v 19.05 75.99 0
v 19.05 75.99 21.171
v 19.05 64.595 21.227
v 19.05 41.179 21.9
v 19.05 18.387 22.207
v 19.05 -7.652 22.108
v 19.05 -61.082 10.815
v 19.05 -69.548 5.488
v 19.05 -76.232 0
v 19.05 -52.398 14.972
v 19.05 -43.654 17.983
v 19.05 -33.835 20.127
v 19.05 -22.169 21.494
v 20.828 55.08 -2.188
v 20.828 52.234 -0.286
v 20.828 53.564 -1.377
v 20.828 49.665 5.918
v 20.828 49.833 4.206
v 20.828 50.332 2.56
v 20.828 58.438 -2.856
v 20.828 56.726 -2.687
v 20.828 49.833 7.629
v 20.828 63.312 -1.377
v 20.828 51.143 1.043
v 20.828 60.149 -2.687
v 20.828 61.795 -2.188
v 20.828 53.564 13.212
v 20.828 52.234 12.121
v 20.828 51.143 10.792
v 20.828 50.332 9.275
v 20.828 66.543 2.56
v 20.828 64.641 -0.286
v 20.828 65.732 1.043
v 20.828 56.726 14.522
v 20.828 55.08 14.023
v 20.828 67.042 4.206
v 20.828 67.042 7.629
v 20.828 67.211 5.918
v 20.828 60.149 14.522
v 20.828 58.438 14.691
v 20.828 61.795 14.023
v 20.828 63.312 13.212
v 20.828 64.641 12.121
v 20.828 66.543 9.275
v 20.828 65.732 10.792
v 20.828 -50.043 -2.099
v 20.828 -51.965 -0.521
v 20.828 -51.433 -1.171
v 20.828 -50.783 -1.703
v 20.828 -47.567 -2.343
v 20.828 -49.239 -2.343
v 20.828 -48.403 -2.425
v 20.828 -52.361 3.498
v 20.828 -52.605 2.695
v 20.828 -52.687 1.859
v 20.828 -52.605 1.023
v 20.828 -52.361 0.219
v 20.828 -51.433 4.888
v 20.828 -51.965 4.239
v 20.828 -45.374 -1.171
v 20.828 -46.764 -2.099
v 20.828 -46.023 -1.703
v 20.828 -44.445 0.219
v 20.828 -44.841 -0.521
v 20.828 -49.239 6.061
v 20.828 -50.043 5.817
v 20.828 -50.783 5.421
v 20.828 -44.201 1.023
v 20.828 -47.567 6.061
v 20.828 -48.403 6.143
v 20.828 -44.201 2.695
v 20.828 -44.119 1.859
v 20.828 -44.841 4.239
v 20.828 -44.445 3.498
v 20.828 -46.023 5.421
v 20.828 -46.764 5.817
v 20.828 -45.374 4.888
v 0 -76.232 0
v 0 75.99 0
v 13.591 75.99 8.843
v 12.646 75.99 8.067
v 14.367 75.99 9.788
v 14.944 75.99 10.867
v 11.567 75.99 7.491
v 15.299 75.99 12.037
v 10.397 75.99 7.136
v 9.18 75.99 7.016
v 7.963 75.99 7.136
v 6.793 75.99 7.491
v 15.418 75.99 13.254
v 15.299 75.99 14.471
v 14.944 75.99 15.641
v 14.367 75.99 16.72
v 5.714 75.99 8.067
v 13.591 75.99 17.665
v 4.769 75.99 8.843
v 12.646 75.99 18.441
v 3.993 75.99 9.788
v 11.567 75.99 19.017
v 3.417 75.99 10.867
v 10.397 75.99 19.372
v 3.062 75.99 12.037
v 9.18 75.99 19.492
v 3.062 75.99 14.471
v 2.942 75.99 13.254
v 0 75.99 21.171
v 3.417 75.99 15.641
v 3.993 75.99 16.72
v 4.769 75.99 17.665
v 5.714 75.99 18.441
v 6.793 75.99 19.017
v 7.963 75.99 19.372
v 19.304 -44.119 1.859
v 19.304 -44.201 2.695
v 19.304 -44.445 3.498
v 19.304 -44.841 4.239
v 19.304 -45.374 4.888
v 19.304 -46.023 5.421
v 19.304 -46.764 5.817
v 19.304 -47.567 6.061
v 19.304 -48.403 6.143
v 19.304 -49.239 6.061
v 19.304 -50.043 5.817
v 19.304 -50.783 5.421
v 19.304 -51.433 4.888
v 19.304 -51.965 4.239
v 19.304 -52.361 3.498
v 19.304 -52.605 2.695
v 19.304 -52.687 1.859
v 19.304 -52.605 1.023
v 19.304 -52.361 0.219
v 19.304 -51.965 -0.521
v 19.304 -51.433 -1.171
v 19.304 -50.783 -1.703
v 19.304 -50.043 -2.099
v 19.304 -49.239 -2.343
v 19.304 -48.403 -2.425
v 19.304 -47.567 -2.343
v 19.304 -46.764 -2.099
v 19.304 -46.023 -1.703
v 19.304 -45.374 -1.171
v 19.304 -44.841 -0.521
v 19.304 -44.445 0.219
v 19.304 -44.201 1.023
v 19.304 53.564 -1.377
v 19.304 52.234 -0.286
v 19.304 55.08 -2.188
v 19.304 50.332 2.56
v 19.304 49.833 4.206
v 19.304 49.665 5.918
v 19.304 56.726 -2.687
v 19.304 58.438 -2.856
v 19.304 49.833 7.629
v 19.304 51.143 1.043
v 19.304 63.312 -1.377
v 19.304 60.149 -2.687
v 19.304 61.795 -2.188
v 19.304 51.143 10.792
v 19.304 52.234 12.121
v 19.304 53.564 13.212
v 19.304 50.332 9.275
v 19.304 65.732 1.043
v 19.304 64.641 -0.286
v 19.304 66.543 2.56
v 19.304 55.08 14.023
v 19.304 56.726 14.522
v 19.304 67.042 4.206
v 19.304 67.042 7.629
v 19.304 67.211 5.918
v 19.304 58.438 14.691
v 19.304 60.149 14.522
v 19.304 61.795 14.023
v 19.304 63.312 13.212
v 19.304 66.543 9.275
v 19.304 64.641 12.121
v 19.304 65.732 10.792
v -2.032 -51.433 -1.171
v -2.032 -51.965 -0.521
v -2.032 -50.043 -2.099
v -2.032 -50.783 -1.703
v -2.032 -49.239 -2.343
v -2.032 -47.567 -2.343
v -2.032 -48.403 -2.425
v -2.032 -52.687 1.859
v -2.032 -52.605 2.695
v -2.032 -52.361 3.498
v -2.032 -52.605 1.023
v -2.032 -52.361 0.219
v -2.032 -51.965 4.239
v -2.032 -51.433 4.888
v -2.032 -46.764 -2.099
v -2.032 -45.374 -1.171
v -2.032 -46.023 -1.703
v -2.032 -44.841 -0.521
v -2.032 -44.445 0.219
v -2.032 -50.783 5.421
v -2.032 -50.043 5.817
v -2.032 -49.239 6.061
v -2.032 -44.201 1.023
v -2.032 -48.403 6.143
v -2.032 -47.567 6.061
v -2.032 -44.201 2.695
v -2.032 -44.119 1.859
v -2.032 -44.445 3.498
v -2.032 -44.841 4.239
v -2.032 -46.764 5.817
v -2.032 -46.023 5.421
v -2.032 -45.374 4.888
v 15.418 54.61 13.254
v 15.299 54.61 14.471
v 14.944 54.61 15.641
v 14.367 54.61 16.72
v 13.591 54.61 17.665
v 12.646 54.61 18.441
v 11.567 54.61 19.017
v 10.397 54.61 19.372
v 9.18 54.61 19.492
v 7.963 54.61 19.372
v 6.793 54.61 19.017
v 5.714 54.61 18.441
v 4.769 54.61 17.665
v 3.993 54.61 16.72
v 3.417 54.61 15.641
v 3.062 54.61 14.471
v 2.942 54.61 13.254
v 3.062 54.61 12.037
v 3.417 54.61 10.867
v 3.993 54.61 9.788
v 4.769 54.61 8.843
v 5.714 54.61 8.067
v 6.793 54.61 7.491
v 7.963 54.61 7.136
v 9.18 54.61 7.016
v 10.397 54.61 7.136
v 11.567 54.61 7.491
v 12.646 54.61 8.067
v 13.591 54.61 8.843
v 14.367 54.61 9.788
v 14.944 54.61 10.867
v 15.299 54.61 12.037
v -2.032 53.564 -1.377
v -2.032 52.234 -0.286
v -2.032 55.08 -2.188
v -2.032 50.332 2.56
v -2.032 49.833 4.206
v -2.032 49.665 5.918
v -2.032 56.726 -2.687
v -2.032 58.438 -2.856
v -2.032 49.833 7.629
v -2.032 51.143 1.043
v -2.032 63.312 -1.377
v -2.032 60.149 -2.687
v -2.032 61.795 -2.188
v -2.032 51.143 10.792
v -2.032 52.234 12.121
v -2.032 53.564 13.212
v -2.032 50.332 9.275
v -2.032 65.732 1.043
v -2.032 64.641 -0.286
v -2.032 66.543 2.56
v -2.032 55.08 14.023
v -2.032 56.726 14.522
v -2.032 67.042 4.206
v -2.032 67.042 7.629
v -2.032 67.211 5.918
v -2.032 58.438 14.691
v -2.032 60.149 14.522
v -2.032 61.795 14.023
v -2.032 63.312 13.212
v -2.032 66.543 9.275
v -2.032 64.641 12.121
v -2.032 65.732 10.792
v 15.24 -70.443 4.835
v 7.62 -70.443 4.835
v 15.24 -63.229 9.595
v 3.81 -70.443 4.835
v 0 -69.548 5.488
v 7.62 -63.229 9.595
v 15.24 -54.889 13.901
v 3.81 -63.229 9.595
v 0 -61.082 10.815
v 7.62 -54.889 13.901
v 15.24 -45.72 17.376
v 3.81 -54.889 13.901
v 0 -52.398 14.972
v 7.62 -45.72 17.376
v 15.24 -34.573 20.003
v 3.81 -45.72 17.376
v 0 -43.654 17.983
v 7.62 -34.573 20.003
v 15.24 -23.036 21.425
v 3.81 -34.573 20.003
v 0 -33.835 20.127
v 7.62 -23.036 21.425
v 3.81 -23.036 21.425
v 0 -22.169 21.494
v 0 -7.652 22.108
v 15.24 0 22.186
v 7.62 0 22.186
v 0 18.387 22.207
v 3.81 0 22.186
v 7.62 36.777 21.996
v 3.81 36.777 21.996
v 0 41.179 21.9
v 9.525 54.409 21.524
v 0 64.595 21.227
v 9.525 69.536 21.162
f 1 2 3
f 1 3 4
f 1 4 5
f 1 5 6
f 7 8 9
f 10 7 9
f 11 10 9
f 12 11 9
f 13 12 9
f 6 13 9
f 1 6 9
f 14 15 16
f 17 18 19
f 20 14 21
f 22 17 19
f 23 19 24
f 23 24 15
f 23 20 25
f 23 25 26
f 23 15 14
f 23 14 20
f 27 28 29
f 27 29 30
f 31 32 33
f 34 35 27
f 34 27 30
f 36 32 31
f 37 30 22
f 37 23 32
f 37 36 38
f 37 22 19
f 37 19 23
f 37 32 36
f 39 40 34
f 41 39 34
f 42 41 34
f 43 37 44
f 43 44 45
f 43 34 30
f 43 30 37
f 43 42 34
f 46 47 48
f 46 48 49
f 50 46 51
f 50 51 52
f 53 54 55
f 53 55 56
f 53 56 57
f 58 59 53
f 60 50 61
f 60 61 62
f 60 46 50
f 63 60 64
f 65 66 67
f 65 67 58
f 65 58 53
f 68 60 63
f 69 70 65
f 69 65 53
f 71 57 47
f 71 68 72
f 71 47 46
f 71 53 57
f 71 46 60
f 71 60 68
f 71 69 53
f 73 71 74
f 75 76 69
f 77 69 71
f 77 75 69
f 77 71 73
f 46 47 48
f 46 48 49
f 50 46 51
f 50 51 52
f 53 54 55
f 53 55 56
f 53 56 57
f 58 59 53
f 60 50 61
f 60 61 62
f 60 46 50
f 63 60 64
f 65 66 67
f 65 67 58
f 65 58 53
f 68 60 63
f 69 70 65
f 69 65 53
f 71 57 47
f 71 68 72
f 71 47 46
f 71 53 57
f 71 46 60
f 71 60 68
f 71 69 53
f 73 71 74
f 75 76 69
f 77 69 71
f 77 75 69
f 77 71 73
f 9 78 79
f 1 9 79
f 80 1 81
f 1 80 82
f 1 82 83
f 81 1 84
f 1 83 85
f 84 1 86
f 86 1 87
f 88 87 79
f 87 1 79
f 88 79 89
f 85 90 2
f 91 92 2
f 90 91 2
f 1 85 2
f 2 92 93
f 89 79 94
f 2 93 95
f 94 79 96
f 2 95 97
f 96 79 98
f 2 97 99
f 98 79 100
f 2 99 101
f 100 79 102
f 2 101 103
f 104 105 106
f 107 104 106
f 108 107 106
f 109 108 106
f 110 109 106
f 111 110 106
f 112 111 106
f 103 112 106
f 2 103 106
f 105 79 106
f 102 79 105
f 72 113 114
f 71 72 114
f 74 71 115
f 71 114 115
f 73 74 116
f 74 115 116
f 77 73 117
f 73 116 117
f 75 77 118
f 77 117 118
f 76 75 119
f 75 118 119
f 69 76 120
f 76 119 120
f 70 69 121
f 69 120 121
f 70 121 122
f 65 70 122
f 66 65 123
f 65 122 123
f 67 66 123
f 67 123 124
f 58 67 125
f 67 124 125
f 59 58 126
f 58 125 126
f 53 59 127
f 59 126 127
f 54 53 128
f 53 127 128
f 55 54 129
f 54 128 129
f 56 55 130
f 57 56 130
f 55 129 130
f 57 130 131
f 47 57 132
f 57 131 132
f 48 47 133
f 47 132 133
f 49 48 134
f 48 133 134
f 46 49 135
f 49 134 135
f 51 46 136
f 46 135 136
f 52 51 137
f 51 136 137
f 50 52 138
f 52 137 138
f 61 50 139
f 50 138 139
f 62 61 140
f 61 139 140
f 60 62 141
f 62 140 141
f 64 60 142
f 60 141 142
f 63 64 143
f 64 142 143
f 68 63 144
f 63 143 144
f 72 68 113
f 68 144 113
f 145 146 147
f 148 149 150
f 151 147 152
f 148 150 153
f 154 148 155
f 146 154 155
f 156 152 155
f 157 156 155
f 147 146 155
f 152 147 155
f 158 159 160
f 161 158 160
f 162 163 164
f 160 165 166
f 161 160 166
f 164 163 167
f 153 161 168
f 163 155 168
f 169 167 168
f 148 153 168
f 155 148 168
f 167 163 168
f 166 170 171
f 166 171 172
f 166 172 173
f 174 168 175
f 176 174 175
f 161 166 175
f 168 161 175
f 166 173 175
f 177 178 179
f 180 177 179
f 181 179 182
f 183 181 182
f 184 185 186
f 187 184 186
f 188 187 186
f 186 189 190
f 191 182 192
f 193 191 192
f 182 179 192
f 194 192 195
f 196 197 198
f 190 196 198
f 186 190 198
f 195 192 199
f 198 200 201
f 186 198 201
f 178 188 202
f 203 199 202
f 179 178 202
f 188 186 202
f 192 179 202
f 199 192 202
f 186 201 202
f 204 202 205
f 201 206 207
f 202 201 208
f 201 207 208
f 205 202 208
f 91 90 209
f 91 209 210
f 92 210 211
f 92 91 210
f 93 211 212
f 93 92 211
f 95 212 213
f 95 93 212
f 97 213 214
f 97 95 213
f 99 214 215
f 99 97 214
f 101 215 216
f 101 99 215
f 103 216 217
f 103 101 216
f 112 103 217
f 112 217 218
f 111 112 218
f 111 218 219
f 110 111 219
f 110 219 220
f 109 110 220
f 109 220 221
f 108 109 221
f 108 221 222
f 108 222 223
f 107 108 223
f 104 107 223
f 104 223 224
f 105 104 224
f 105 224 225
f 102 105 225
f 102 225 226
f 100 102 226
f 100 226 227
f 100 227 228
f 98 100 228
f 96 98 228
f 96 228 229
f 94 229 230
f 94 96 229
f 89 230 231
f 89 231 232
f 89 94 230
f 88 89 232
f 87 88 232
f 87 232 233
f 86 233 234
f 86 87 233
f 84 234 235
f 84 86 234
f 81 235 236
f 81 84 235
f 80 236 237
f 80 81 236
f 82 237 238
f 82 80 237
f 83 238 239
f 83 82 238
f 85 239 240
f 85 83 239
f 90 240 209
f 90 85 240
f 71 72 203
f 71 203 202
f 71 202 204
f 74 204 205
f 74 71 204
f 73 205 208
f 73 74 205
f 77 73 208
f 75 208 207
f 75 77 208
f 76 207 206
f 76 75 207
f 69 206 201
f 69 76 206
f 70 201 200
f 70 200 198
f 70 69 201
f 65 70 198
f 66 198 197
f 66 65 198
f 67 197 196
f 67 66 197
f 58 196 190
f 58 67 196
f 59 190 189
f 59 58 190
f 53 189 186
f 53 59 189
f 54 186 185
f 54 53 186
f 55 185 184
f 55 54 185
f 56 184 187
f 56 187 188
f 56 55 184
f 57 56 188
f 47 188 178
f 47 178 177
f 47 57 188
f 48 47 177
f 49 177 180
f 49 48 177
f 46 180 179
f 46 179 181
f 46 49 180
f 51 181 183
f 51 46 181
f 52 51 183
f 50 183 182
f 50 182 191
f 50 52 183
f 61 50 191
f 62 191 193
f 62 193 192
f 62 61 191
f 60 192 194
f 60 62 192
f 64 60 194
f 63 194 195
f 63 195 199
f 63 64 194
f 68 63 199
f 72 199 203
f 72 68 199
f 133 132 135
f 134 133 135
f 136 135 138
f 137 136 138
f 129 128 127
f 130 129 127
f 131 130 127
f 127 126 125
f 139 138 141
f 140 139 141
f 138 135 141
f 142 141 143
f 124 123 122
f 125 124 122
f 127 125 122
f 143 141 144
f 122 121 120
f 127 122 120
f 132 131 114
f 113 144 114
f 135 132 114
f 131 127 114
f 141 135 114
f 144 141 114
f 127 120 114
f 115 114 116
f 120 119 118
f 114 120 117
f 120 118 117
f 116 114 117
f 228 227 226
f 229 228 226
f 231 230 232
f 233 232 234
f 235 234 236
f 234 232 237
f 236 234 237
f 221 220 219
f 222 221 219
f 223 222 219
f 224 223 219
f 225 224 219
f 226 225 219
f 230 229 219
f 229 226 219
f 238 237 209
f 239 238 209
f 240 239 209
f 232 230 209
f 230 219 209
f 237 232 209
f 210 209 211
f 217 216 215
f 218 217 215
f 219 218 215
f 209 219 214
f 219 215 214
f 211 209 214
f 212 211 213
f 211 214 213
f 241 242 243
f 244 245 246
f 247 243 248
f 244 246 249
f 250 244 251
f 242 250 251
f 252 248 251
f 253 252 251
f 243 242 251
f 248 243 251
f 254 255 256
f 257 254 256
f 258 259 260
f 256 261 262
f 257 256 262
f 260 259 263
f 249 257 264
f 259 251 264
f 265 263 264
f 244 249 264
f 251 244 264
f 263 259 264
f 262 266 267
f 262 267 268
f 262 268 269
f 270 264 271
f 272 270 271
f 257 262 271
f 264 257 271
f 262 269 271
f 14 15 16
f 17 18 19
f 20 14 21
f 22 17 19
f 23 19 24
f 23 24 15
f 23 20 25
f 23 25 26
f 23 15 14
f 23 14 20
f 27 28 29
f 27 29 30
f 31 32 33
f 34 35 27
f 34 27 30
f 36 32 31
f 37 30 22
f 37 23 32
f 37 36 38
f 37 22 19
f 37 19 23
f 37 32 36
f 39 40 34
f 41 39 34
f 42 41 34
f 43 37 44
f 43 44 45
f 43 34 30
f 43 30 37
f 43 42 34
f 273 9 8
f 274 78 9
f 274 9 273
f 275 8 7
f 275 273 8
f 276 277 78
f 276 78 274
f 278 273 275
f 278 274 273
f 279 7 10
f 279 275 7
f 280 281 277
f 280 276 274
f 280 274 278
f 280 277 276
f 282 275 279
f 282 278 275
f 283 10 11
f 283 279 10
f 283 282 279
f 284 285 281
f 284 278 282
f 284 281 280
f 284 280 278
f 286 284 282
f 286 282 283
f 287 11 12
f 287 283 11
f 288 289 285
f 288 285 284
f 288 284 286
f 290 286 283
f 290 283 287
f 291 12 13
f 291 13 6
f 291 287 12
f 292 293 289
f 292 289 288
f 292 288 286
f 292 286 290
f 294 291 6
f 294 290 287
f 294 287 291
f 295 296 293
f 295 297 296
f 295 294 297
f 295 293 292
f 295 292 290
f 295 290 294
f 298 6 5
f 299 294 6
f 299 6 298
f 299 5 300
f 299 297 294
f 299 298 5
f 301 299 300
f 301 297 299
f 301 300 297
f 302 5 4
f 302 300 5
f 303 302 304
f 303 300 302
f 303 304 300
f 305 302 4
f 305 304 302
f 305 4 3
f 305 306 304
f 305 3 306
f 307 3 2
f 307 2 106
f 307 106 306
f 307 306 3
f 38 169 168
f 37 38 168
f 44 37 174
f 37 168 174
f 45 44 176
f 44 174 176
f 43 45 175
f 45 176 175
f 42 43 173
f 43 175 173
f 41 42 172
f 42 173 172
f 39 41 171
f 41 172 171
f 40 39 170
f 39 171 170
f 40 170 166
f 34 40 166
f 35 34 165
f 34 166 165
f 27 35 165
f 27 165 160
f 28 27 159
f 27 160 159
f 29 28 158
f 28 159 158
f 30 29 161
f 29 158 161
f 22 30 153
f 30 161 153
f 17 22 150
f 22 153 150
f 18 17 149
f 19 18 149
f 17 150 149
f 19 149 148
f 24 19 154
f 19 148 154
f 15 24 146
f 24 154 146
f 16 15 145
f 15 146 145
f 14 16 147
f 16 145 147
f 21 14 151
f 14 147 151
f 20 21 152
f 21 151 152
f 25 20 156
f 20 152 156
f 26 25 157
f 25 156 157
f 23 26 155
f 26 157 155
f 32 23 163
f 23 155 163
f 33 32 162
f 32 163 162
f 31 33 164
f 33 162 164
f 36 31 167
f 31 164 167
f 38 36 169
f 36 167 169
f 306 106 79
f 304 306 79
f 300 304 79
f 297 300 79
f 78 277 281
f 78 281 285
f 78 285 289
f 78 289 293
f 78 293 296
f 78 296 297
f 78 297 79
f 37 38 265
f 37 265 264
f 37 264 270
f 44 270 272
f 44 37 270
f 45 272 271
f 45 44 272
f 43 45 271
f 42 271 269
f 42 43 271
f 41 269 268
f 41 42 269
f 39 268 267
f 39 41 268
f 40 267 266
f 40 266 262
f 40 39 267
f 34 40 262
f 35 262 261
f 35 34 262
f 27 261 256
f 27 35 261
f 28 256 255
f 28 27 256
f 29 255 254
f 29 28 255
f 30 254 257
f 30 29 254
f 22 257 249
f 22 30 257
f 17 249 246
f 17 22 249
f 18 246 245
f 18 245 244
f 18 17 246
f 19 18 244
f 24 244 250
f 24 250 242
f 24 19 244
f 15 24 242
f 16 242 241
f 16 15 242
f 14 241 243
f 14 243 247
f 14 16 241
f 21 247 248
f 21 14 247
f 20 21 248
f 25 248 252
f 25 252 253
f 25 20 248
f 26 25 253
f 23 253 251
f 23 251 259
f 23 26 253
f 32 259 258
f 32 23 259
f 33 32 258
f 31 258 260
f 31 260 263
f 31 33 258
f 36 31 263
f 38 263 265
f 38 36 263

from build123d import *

# Parameters (mm, degrees)
F1_DEPTH = 19.05
F3_R     = 6.2382678549
F4_DEPTH = 30.988
F6_R     = 4.2841915503
F7_DEPTH = 1.524
F6_R_2   = 8.7731275046
F8_DEPTH = 22.86


with BuildPart() as f1:
    # F0 (on Right) → F1 (new body)
    with BuildSketch(Plane.YZ):
        with BuildLine():
            add(Edge.make_bspline(
                [(-76.2317553163, 0), (-69.5952960879, 6.3280747123), (-45.5129625615, 21.6339532101), (-0.3411145183, 22.3184860208), (35.2910162242, 22.1785555019), (60.592190821, 21.3033350883), (68.2554357349, 21.1202997935), (75.990460813, 21.1709290743)],
                knots=[0, 0, 0, 0, 0.2147331909, 0.4604411673, 0.6802066075, 0.8538054631, 1, 1, 1, 1], degree=3))
            Line((-76.2317553163, 0), (75.990460813, 0))
            Line((75.990460813, 0), (75.990460813, 21.1709290743))
        make_face()
    extrude(amount=F1_DEPTH)

    # F3 (on offset) → F4 (cut)
    with BuildSketch(Plane.XZ.offset(-85.598)):
        with Locations((9.1801350936, 13.2540538907)):
            Circle(F3_R)
    extrude(amount=F4_DEPTH, mode=Mode.SUBTRACT)


with BuildPart() as f7:
    # F6 (on offset) → F7 (new body)
    with BuildSketch(Plane.YZ.offset(19.304)):
        with Locations((-48.4031774104, 1.8587660743)):
            Circle(F6_R)
    extrude(amount=F7_DEPTH)


with BuildPart() as f7b:
    # F6 (on offset) → F7, piece 2 (new body)
    with BuildSketch(Plane.YZ.offset(19.304)):
        with Locations((58.4376677871, 5.917571485)):
            Circle(F6_R_2)
    extrude(amount=F7_DEPTH)


with BuildPart() as f8:
    # F8 (new): a face of the model
    f8_faces = [f7.part.faces().sort_by_distance(p)[0] for p in [
        (20.828, -48.4031774104, 1.8587660743),
    ]]
    extrude(f8_faces, amount=-F8_DEPTH)


with BuildPart() as f8b:
    # F8#2 (new): a face of the model
    f8_2_faces = [f7b.part.faces().sort_by_distance(p)[0] for p in [
        (20.828, 58.4376677871, 5.917571485),
    ]]
    extrude(f8_2_faces, amount=-F8_DEPTH)


solid = Compound([f1.part, f7.part, f7b.part, f8.part, f8b.part])
